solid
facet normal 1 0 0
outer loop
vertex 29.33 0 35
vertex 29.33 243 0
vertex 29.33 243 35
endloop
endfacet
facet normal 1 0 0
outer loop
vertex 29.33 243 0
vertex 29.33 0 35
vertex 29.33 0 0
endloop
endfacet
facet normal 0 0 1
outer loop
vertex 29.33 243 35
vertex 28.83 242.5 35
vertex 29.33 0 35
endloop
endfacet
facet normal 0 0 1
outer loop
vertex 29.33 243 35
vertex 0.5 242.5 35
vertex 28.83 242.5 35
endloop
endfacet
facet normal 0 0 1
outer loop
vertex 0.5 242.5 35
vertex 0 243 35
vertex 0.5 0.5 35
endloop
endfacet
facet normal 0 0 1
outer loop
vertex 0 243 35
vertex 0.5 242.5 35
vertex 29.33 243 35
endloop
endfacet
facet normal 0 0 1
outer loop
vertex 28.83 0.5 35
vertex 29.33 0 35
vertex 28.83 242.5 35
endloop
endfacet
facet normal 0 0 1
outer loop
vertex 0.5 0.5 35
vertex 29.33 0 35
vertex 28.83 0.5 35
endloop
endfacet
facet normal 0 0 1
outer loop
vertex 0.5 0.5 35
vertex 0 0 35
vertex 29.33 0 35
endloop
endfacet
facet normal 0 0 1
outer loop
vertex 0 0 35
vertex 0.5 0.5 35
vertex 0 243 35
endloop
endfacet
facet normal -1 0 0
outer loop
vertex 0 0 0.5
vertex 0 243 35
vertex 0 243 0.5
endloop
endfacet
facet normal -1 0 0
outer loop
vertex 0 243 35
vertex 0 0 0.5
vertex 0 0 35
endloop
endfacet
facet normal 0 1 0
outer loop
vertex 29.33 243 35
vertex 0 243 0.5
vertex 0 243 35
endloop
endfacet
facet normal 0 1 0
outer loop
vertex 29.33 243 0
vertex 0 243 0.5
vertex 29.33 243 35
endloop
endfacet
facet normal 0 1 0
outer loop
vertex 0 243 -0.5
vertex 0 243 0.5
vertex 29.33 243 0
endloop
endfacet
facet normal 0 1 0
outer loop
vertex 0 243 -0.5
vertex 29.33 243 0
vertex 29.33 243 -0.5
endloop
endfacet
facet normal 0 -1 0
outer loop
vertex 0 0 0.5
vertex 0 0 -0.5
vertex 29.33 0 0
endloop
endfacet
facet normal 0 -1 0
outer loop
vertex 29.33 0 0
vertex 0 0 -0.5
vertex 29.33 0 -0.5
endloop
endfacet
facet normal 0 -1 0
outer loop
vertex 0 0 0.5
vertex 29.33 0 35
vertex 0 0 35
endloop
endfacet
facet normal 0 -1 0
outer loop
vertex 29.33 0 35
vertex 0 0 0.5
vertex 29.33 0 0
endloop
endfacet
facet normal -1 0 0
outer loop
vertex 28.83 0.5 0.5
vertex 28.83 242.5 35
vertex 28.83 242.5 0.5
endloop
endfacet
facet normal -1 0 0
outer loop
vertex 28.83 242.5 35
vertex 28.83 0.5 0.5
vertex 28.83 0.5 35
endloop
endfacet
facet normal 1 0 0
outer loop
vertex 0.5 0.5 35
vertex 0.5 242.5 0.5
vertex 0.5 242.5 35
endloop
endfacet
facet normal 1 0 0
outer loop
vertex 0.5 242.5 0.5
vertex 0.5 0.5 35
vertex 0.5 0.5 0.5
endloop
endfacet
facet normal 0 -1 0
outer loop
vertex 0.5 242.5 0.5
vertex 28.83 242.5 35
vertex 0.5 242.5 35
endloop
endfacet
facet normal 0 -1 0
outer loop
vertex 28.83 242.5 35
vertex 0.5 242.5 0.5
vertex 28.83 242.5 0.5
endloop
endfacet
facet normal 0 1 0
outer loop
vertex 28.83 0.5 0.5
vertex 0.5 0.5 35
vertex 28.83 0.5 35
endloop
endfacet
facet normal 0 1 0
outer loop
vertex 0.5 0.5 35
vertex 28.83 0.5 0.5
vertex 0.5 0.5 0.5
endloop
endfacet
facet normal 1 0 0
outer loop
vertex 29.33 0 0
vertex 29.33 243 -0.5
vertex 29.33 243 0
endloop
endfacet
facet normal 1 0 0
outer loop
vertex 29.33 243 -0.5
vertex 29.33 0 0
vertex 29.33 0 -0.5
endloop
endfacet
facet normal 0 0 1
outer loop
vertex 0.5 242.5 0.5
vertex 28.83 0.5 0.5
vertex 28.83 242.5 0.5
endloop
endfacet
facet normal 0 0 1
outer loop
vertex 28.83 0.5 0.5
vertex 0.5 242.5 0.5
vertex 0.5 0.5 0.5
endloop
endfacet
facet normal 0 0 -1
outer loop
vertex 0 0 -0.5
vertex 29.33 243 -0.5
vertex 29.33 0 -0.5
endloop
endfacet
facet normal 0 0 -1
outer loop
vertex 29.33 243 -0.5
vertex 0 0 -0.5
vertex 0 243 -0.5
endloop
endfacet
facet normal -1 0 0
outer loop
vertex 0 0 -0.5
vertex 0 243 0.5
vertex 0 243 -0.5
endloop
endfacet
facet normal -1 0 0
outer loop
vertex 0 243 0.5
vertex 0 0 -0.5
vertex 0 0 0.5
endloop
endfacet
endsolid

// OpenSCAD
BoxTopLength=197;
BoxTopWidth=197;
BoxHeight=190;
LipHeight=4;
LipThickness=2;
LipOverHangWidth=25;
BoxTopThickness=2;
BoxThickness=2;
IsOpenTop=true;



//meshX=26;
meshY=18;
meshZ=40;
Seedrows=4;
Seedcolumns=4;

spokeCount=24;
spokerows=8;
spokeDia=15;
spokeY=2;
wallWidth=2;


module Box(x,y,wall, height)
{
    b_floor = wall;
    //resize([0,0,0]) 
    translate([x/2,y/2,0]) 
    cube([x,y,b_floor],true); //box floor
    difference()
    {
    BoxWalls(x,y,wall,height);
//    color("blue") translate([-5,y/2,height-(meshZ/2)])
//    rotate(a=180, v=[1,0,1]) cylinder(20,5,5, false);
    }
    
}

module BoxWalls(x,y,wall, height)
{
     translate([x/2,y/2,height/2]) difference()
    {
    cube([x,y,height],true);
    cube([x-wall,y-wall,height+1], true);
    }
}

module drawTray()
{

Box(29.33,243,1,35);
}

drawTray();
